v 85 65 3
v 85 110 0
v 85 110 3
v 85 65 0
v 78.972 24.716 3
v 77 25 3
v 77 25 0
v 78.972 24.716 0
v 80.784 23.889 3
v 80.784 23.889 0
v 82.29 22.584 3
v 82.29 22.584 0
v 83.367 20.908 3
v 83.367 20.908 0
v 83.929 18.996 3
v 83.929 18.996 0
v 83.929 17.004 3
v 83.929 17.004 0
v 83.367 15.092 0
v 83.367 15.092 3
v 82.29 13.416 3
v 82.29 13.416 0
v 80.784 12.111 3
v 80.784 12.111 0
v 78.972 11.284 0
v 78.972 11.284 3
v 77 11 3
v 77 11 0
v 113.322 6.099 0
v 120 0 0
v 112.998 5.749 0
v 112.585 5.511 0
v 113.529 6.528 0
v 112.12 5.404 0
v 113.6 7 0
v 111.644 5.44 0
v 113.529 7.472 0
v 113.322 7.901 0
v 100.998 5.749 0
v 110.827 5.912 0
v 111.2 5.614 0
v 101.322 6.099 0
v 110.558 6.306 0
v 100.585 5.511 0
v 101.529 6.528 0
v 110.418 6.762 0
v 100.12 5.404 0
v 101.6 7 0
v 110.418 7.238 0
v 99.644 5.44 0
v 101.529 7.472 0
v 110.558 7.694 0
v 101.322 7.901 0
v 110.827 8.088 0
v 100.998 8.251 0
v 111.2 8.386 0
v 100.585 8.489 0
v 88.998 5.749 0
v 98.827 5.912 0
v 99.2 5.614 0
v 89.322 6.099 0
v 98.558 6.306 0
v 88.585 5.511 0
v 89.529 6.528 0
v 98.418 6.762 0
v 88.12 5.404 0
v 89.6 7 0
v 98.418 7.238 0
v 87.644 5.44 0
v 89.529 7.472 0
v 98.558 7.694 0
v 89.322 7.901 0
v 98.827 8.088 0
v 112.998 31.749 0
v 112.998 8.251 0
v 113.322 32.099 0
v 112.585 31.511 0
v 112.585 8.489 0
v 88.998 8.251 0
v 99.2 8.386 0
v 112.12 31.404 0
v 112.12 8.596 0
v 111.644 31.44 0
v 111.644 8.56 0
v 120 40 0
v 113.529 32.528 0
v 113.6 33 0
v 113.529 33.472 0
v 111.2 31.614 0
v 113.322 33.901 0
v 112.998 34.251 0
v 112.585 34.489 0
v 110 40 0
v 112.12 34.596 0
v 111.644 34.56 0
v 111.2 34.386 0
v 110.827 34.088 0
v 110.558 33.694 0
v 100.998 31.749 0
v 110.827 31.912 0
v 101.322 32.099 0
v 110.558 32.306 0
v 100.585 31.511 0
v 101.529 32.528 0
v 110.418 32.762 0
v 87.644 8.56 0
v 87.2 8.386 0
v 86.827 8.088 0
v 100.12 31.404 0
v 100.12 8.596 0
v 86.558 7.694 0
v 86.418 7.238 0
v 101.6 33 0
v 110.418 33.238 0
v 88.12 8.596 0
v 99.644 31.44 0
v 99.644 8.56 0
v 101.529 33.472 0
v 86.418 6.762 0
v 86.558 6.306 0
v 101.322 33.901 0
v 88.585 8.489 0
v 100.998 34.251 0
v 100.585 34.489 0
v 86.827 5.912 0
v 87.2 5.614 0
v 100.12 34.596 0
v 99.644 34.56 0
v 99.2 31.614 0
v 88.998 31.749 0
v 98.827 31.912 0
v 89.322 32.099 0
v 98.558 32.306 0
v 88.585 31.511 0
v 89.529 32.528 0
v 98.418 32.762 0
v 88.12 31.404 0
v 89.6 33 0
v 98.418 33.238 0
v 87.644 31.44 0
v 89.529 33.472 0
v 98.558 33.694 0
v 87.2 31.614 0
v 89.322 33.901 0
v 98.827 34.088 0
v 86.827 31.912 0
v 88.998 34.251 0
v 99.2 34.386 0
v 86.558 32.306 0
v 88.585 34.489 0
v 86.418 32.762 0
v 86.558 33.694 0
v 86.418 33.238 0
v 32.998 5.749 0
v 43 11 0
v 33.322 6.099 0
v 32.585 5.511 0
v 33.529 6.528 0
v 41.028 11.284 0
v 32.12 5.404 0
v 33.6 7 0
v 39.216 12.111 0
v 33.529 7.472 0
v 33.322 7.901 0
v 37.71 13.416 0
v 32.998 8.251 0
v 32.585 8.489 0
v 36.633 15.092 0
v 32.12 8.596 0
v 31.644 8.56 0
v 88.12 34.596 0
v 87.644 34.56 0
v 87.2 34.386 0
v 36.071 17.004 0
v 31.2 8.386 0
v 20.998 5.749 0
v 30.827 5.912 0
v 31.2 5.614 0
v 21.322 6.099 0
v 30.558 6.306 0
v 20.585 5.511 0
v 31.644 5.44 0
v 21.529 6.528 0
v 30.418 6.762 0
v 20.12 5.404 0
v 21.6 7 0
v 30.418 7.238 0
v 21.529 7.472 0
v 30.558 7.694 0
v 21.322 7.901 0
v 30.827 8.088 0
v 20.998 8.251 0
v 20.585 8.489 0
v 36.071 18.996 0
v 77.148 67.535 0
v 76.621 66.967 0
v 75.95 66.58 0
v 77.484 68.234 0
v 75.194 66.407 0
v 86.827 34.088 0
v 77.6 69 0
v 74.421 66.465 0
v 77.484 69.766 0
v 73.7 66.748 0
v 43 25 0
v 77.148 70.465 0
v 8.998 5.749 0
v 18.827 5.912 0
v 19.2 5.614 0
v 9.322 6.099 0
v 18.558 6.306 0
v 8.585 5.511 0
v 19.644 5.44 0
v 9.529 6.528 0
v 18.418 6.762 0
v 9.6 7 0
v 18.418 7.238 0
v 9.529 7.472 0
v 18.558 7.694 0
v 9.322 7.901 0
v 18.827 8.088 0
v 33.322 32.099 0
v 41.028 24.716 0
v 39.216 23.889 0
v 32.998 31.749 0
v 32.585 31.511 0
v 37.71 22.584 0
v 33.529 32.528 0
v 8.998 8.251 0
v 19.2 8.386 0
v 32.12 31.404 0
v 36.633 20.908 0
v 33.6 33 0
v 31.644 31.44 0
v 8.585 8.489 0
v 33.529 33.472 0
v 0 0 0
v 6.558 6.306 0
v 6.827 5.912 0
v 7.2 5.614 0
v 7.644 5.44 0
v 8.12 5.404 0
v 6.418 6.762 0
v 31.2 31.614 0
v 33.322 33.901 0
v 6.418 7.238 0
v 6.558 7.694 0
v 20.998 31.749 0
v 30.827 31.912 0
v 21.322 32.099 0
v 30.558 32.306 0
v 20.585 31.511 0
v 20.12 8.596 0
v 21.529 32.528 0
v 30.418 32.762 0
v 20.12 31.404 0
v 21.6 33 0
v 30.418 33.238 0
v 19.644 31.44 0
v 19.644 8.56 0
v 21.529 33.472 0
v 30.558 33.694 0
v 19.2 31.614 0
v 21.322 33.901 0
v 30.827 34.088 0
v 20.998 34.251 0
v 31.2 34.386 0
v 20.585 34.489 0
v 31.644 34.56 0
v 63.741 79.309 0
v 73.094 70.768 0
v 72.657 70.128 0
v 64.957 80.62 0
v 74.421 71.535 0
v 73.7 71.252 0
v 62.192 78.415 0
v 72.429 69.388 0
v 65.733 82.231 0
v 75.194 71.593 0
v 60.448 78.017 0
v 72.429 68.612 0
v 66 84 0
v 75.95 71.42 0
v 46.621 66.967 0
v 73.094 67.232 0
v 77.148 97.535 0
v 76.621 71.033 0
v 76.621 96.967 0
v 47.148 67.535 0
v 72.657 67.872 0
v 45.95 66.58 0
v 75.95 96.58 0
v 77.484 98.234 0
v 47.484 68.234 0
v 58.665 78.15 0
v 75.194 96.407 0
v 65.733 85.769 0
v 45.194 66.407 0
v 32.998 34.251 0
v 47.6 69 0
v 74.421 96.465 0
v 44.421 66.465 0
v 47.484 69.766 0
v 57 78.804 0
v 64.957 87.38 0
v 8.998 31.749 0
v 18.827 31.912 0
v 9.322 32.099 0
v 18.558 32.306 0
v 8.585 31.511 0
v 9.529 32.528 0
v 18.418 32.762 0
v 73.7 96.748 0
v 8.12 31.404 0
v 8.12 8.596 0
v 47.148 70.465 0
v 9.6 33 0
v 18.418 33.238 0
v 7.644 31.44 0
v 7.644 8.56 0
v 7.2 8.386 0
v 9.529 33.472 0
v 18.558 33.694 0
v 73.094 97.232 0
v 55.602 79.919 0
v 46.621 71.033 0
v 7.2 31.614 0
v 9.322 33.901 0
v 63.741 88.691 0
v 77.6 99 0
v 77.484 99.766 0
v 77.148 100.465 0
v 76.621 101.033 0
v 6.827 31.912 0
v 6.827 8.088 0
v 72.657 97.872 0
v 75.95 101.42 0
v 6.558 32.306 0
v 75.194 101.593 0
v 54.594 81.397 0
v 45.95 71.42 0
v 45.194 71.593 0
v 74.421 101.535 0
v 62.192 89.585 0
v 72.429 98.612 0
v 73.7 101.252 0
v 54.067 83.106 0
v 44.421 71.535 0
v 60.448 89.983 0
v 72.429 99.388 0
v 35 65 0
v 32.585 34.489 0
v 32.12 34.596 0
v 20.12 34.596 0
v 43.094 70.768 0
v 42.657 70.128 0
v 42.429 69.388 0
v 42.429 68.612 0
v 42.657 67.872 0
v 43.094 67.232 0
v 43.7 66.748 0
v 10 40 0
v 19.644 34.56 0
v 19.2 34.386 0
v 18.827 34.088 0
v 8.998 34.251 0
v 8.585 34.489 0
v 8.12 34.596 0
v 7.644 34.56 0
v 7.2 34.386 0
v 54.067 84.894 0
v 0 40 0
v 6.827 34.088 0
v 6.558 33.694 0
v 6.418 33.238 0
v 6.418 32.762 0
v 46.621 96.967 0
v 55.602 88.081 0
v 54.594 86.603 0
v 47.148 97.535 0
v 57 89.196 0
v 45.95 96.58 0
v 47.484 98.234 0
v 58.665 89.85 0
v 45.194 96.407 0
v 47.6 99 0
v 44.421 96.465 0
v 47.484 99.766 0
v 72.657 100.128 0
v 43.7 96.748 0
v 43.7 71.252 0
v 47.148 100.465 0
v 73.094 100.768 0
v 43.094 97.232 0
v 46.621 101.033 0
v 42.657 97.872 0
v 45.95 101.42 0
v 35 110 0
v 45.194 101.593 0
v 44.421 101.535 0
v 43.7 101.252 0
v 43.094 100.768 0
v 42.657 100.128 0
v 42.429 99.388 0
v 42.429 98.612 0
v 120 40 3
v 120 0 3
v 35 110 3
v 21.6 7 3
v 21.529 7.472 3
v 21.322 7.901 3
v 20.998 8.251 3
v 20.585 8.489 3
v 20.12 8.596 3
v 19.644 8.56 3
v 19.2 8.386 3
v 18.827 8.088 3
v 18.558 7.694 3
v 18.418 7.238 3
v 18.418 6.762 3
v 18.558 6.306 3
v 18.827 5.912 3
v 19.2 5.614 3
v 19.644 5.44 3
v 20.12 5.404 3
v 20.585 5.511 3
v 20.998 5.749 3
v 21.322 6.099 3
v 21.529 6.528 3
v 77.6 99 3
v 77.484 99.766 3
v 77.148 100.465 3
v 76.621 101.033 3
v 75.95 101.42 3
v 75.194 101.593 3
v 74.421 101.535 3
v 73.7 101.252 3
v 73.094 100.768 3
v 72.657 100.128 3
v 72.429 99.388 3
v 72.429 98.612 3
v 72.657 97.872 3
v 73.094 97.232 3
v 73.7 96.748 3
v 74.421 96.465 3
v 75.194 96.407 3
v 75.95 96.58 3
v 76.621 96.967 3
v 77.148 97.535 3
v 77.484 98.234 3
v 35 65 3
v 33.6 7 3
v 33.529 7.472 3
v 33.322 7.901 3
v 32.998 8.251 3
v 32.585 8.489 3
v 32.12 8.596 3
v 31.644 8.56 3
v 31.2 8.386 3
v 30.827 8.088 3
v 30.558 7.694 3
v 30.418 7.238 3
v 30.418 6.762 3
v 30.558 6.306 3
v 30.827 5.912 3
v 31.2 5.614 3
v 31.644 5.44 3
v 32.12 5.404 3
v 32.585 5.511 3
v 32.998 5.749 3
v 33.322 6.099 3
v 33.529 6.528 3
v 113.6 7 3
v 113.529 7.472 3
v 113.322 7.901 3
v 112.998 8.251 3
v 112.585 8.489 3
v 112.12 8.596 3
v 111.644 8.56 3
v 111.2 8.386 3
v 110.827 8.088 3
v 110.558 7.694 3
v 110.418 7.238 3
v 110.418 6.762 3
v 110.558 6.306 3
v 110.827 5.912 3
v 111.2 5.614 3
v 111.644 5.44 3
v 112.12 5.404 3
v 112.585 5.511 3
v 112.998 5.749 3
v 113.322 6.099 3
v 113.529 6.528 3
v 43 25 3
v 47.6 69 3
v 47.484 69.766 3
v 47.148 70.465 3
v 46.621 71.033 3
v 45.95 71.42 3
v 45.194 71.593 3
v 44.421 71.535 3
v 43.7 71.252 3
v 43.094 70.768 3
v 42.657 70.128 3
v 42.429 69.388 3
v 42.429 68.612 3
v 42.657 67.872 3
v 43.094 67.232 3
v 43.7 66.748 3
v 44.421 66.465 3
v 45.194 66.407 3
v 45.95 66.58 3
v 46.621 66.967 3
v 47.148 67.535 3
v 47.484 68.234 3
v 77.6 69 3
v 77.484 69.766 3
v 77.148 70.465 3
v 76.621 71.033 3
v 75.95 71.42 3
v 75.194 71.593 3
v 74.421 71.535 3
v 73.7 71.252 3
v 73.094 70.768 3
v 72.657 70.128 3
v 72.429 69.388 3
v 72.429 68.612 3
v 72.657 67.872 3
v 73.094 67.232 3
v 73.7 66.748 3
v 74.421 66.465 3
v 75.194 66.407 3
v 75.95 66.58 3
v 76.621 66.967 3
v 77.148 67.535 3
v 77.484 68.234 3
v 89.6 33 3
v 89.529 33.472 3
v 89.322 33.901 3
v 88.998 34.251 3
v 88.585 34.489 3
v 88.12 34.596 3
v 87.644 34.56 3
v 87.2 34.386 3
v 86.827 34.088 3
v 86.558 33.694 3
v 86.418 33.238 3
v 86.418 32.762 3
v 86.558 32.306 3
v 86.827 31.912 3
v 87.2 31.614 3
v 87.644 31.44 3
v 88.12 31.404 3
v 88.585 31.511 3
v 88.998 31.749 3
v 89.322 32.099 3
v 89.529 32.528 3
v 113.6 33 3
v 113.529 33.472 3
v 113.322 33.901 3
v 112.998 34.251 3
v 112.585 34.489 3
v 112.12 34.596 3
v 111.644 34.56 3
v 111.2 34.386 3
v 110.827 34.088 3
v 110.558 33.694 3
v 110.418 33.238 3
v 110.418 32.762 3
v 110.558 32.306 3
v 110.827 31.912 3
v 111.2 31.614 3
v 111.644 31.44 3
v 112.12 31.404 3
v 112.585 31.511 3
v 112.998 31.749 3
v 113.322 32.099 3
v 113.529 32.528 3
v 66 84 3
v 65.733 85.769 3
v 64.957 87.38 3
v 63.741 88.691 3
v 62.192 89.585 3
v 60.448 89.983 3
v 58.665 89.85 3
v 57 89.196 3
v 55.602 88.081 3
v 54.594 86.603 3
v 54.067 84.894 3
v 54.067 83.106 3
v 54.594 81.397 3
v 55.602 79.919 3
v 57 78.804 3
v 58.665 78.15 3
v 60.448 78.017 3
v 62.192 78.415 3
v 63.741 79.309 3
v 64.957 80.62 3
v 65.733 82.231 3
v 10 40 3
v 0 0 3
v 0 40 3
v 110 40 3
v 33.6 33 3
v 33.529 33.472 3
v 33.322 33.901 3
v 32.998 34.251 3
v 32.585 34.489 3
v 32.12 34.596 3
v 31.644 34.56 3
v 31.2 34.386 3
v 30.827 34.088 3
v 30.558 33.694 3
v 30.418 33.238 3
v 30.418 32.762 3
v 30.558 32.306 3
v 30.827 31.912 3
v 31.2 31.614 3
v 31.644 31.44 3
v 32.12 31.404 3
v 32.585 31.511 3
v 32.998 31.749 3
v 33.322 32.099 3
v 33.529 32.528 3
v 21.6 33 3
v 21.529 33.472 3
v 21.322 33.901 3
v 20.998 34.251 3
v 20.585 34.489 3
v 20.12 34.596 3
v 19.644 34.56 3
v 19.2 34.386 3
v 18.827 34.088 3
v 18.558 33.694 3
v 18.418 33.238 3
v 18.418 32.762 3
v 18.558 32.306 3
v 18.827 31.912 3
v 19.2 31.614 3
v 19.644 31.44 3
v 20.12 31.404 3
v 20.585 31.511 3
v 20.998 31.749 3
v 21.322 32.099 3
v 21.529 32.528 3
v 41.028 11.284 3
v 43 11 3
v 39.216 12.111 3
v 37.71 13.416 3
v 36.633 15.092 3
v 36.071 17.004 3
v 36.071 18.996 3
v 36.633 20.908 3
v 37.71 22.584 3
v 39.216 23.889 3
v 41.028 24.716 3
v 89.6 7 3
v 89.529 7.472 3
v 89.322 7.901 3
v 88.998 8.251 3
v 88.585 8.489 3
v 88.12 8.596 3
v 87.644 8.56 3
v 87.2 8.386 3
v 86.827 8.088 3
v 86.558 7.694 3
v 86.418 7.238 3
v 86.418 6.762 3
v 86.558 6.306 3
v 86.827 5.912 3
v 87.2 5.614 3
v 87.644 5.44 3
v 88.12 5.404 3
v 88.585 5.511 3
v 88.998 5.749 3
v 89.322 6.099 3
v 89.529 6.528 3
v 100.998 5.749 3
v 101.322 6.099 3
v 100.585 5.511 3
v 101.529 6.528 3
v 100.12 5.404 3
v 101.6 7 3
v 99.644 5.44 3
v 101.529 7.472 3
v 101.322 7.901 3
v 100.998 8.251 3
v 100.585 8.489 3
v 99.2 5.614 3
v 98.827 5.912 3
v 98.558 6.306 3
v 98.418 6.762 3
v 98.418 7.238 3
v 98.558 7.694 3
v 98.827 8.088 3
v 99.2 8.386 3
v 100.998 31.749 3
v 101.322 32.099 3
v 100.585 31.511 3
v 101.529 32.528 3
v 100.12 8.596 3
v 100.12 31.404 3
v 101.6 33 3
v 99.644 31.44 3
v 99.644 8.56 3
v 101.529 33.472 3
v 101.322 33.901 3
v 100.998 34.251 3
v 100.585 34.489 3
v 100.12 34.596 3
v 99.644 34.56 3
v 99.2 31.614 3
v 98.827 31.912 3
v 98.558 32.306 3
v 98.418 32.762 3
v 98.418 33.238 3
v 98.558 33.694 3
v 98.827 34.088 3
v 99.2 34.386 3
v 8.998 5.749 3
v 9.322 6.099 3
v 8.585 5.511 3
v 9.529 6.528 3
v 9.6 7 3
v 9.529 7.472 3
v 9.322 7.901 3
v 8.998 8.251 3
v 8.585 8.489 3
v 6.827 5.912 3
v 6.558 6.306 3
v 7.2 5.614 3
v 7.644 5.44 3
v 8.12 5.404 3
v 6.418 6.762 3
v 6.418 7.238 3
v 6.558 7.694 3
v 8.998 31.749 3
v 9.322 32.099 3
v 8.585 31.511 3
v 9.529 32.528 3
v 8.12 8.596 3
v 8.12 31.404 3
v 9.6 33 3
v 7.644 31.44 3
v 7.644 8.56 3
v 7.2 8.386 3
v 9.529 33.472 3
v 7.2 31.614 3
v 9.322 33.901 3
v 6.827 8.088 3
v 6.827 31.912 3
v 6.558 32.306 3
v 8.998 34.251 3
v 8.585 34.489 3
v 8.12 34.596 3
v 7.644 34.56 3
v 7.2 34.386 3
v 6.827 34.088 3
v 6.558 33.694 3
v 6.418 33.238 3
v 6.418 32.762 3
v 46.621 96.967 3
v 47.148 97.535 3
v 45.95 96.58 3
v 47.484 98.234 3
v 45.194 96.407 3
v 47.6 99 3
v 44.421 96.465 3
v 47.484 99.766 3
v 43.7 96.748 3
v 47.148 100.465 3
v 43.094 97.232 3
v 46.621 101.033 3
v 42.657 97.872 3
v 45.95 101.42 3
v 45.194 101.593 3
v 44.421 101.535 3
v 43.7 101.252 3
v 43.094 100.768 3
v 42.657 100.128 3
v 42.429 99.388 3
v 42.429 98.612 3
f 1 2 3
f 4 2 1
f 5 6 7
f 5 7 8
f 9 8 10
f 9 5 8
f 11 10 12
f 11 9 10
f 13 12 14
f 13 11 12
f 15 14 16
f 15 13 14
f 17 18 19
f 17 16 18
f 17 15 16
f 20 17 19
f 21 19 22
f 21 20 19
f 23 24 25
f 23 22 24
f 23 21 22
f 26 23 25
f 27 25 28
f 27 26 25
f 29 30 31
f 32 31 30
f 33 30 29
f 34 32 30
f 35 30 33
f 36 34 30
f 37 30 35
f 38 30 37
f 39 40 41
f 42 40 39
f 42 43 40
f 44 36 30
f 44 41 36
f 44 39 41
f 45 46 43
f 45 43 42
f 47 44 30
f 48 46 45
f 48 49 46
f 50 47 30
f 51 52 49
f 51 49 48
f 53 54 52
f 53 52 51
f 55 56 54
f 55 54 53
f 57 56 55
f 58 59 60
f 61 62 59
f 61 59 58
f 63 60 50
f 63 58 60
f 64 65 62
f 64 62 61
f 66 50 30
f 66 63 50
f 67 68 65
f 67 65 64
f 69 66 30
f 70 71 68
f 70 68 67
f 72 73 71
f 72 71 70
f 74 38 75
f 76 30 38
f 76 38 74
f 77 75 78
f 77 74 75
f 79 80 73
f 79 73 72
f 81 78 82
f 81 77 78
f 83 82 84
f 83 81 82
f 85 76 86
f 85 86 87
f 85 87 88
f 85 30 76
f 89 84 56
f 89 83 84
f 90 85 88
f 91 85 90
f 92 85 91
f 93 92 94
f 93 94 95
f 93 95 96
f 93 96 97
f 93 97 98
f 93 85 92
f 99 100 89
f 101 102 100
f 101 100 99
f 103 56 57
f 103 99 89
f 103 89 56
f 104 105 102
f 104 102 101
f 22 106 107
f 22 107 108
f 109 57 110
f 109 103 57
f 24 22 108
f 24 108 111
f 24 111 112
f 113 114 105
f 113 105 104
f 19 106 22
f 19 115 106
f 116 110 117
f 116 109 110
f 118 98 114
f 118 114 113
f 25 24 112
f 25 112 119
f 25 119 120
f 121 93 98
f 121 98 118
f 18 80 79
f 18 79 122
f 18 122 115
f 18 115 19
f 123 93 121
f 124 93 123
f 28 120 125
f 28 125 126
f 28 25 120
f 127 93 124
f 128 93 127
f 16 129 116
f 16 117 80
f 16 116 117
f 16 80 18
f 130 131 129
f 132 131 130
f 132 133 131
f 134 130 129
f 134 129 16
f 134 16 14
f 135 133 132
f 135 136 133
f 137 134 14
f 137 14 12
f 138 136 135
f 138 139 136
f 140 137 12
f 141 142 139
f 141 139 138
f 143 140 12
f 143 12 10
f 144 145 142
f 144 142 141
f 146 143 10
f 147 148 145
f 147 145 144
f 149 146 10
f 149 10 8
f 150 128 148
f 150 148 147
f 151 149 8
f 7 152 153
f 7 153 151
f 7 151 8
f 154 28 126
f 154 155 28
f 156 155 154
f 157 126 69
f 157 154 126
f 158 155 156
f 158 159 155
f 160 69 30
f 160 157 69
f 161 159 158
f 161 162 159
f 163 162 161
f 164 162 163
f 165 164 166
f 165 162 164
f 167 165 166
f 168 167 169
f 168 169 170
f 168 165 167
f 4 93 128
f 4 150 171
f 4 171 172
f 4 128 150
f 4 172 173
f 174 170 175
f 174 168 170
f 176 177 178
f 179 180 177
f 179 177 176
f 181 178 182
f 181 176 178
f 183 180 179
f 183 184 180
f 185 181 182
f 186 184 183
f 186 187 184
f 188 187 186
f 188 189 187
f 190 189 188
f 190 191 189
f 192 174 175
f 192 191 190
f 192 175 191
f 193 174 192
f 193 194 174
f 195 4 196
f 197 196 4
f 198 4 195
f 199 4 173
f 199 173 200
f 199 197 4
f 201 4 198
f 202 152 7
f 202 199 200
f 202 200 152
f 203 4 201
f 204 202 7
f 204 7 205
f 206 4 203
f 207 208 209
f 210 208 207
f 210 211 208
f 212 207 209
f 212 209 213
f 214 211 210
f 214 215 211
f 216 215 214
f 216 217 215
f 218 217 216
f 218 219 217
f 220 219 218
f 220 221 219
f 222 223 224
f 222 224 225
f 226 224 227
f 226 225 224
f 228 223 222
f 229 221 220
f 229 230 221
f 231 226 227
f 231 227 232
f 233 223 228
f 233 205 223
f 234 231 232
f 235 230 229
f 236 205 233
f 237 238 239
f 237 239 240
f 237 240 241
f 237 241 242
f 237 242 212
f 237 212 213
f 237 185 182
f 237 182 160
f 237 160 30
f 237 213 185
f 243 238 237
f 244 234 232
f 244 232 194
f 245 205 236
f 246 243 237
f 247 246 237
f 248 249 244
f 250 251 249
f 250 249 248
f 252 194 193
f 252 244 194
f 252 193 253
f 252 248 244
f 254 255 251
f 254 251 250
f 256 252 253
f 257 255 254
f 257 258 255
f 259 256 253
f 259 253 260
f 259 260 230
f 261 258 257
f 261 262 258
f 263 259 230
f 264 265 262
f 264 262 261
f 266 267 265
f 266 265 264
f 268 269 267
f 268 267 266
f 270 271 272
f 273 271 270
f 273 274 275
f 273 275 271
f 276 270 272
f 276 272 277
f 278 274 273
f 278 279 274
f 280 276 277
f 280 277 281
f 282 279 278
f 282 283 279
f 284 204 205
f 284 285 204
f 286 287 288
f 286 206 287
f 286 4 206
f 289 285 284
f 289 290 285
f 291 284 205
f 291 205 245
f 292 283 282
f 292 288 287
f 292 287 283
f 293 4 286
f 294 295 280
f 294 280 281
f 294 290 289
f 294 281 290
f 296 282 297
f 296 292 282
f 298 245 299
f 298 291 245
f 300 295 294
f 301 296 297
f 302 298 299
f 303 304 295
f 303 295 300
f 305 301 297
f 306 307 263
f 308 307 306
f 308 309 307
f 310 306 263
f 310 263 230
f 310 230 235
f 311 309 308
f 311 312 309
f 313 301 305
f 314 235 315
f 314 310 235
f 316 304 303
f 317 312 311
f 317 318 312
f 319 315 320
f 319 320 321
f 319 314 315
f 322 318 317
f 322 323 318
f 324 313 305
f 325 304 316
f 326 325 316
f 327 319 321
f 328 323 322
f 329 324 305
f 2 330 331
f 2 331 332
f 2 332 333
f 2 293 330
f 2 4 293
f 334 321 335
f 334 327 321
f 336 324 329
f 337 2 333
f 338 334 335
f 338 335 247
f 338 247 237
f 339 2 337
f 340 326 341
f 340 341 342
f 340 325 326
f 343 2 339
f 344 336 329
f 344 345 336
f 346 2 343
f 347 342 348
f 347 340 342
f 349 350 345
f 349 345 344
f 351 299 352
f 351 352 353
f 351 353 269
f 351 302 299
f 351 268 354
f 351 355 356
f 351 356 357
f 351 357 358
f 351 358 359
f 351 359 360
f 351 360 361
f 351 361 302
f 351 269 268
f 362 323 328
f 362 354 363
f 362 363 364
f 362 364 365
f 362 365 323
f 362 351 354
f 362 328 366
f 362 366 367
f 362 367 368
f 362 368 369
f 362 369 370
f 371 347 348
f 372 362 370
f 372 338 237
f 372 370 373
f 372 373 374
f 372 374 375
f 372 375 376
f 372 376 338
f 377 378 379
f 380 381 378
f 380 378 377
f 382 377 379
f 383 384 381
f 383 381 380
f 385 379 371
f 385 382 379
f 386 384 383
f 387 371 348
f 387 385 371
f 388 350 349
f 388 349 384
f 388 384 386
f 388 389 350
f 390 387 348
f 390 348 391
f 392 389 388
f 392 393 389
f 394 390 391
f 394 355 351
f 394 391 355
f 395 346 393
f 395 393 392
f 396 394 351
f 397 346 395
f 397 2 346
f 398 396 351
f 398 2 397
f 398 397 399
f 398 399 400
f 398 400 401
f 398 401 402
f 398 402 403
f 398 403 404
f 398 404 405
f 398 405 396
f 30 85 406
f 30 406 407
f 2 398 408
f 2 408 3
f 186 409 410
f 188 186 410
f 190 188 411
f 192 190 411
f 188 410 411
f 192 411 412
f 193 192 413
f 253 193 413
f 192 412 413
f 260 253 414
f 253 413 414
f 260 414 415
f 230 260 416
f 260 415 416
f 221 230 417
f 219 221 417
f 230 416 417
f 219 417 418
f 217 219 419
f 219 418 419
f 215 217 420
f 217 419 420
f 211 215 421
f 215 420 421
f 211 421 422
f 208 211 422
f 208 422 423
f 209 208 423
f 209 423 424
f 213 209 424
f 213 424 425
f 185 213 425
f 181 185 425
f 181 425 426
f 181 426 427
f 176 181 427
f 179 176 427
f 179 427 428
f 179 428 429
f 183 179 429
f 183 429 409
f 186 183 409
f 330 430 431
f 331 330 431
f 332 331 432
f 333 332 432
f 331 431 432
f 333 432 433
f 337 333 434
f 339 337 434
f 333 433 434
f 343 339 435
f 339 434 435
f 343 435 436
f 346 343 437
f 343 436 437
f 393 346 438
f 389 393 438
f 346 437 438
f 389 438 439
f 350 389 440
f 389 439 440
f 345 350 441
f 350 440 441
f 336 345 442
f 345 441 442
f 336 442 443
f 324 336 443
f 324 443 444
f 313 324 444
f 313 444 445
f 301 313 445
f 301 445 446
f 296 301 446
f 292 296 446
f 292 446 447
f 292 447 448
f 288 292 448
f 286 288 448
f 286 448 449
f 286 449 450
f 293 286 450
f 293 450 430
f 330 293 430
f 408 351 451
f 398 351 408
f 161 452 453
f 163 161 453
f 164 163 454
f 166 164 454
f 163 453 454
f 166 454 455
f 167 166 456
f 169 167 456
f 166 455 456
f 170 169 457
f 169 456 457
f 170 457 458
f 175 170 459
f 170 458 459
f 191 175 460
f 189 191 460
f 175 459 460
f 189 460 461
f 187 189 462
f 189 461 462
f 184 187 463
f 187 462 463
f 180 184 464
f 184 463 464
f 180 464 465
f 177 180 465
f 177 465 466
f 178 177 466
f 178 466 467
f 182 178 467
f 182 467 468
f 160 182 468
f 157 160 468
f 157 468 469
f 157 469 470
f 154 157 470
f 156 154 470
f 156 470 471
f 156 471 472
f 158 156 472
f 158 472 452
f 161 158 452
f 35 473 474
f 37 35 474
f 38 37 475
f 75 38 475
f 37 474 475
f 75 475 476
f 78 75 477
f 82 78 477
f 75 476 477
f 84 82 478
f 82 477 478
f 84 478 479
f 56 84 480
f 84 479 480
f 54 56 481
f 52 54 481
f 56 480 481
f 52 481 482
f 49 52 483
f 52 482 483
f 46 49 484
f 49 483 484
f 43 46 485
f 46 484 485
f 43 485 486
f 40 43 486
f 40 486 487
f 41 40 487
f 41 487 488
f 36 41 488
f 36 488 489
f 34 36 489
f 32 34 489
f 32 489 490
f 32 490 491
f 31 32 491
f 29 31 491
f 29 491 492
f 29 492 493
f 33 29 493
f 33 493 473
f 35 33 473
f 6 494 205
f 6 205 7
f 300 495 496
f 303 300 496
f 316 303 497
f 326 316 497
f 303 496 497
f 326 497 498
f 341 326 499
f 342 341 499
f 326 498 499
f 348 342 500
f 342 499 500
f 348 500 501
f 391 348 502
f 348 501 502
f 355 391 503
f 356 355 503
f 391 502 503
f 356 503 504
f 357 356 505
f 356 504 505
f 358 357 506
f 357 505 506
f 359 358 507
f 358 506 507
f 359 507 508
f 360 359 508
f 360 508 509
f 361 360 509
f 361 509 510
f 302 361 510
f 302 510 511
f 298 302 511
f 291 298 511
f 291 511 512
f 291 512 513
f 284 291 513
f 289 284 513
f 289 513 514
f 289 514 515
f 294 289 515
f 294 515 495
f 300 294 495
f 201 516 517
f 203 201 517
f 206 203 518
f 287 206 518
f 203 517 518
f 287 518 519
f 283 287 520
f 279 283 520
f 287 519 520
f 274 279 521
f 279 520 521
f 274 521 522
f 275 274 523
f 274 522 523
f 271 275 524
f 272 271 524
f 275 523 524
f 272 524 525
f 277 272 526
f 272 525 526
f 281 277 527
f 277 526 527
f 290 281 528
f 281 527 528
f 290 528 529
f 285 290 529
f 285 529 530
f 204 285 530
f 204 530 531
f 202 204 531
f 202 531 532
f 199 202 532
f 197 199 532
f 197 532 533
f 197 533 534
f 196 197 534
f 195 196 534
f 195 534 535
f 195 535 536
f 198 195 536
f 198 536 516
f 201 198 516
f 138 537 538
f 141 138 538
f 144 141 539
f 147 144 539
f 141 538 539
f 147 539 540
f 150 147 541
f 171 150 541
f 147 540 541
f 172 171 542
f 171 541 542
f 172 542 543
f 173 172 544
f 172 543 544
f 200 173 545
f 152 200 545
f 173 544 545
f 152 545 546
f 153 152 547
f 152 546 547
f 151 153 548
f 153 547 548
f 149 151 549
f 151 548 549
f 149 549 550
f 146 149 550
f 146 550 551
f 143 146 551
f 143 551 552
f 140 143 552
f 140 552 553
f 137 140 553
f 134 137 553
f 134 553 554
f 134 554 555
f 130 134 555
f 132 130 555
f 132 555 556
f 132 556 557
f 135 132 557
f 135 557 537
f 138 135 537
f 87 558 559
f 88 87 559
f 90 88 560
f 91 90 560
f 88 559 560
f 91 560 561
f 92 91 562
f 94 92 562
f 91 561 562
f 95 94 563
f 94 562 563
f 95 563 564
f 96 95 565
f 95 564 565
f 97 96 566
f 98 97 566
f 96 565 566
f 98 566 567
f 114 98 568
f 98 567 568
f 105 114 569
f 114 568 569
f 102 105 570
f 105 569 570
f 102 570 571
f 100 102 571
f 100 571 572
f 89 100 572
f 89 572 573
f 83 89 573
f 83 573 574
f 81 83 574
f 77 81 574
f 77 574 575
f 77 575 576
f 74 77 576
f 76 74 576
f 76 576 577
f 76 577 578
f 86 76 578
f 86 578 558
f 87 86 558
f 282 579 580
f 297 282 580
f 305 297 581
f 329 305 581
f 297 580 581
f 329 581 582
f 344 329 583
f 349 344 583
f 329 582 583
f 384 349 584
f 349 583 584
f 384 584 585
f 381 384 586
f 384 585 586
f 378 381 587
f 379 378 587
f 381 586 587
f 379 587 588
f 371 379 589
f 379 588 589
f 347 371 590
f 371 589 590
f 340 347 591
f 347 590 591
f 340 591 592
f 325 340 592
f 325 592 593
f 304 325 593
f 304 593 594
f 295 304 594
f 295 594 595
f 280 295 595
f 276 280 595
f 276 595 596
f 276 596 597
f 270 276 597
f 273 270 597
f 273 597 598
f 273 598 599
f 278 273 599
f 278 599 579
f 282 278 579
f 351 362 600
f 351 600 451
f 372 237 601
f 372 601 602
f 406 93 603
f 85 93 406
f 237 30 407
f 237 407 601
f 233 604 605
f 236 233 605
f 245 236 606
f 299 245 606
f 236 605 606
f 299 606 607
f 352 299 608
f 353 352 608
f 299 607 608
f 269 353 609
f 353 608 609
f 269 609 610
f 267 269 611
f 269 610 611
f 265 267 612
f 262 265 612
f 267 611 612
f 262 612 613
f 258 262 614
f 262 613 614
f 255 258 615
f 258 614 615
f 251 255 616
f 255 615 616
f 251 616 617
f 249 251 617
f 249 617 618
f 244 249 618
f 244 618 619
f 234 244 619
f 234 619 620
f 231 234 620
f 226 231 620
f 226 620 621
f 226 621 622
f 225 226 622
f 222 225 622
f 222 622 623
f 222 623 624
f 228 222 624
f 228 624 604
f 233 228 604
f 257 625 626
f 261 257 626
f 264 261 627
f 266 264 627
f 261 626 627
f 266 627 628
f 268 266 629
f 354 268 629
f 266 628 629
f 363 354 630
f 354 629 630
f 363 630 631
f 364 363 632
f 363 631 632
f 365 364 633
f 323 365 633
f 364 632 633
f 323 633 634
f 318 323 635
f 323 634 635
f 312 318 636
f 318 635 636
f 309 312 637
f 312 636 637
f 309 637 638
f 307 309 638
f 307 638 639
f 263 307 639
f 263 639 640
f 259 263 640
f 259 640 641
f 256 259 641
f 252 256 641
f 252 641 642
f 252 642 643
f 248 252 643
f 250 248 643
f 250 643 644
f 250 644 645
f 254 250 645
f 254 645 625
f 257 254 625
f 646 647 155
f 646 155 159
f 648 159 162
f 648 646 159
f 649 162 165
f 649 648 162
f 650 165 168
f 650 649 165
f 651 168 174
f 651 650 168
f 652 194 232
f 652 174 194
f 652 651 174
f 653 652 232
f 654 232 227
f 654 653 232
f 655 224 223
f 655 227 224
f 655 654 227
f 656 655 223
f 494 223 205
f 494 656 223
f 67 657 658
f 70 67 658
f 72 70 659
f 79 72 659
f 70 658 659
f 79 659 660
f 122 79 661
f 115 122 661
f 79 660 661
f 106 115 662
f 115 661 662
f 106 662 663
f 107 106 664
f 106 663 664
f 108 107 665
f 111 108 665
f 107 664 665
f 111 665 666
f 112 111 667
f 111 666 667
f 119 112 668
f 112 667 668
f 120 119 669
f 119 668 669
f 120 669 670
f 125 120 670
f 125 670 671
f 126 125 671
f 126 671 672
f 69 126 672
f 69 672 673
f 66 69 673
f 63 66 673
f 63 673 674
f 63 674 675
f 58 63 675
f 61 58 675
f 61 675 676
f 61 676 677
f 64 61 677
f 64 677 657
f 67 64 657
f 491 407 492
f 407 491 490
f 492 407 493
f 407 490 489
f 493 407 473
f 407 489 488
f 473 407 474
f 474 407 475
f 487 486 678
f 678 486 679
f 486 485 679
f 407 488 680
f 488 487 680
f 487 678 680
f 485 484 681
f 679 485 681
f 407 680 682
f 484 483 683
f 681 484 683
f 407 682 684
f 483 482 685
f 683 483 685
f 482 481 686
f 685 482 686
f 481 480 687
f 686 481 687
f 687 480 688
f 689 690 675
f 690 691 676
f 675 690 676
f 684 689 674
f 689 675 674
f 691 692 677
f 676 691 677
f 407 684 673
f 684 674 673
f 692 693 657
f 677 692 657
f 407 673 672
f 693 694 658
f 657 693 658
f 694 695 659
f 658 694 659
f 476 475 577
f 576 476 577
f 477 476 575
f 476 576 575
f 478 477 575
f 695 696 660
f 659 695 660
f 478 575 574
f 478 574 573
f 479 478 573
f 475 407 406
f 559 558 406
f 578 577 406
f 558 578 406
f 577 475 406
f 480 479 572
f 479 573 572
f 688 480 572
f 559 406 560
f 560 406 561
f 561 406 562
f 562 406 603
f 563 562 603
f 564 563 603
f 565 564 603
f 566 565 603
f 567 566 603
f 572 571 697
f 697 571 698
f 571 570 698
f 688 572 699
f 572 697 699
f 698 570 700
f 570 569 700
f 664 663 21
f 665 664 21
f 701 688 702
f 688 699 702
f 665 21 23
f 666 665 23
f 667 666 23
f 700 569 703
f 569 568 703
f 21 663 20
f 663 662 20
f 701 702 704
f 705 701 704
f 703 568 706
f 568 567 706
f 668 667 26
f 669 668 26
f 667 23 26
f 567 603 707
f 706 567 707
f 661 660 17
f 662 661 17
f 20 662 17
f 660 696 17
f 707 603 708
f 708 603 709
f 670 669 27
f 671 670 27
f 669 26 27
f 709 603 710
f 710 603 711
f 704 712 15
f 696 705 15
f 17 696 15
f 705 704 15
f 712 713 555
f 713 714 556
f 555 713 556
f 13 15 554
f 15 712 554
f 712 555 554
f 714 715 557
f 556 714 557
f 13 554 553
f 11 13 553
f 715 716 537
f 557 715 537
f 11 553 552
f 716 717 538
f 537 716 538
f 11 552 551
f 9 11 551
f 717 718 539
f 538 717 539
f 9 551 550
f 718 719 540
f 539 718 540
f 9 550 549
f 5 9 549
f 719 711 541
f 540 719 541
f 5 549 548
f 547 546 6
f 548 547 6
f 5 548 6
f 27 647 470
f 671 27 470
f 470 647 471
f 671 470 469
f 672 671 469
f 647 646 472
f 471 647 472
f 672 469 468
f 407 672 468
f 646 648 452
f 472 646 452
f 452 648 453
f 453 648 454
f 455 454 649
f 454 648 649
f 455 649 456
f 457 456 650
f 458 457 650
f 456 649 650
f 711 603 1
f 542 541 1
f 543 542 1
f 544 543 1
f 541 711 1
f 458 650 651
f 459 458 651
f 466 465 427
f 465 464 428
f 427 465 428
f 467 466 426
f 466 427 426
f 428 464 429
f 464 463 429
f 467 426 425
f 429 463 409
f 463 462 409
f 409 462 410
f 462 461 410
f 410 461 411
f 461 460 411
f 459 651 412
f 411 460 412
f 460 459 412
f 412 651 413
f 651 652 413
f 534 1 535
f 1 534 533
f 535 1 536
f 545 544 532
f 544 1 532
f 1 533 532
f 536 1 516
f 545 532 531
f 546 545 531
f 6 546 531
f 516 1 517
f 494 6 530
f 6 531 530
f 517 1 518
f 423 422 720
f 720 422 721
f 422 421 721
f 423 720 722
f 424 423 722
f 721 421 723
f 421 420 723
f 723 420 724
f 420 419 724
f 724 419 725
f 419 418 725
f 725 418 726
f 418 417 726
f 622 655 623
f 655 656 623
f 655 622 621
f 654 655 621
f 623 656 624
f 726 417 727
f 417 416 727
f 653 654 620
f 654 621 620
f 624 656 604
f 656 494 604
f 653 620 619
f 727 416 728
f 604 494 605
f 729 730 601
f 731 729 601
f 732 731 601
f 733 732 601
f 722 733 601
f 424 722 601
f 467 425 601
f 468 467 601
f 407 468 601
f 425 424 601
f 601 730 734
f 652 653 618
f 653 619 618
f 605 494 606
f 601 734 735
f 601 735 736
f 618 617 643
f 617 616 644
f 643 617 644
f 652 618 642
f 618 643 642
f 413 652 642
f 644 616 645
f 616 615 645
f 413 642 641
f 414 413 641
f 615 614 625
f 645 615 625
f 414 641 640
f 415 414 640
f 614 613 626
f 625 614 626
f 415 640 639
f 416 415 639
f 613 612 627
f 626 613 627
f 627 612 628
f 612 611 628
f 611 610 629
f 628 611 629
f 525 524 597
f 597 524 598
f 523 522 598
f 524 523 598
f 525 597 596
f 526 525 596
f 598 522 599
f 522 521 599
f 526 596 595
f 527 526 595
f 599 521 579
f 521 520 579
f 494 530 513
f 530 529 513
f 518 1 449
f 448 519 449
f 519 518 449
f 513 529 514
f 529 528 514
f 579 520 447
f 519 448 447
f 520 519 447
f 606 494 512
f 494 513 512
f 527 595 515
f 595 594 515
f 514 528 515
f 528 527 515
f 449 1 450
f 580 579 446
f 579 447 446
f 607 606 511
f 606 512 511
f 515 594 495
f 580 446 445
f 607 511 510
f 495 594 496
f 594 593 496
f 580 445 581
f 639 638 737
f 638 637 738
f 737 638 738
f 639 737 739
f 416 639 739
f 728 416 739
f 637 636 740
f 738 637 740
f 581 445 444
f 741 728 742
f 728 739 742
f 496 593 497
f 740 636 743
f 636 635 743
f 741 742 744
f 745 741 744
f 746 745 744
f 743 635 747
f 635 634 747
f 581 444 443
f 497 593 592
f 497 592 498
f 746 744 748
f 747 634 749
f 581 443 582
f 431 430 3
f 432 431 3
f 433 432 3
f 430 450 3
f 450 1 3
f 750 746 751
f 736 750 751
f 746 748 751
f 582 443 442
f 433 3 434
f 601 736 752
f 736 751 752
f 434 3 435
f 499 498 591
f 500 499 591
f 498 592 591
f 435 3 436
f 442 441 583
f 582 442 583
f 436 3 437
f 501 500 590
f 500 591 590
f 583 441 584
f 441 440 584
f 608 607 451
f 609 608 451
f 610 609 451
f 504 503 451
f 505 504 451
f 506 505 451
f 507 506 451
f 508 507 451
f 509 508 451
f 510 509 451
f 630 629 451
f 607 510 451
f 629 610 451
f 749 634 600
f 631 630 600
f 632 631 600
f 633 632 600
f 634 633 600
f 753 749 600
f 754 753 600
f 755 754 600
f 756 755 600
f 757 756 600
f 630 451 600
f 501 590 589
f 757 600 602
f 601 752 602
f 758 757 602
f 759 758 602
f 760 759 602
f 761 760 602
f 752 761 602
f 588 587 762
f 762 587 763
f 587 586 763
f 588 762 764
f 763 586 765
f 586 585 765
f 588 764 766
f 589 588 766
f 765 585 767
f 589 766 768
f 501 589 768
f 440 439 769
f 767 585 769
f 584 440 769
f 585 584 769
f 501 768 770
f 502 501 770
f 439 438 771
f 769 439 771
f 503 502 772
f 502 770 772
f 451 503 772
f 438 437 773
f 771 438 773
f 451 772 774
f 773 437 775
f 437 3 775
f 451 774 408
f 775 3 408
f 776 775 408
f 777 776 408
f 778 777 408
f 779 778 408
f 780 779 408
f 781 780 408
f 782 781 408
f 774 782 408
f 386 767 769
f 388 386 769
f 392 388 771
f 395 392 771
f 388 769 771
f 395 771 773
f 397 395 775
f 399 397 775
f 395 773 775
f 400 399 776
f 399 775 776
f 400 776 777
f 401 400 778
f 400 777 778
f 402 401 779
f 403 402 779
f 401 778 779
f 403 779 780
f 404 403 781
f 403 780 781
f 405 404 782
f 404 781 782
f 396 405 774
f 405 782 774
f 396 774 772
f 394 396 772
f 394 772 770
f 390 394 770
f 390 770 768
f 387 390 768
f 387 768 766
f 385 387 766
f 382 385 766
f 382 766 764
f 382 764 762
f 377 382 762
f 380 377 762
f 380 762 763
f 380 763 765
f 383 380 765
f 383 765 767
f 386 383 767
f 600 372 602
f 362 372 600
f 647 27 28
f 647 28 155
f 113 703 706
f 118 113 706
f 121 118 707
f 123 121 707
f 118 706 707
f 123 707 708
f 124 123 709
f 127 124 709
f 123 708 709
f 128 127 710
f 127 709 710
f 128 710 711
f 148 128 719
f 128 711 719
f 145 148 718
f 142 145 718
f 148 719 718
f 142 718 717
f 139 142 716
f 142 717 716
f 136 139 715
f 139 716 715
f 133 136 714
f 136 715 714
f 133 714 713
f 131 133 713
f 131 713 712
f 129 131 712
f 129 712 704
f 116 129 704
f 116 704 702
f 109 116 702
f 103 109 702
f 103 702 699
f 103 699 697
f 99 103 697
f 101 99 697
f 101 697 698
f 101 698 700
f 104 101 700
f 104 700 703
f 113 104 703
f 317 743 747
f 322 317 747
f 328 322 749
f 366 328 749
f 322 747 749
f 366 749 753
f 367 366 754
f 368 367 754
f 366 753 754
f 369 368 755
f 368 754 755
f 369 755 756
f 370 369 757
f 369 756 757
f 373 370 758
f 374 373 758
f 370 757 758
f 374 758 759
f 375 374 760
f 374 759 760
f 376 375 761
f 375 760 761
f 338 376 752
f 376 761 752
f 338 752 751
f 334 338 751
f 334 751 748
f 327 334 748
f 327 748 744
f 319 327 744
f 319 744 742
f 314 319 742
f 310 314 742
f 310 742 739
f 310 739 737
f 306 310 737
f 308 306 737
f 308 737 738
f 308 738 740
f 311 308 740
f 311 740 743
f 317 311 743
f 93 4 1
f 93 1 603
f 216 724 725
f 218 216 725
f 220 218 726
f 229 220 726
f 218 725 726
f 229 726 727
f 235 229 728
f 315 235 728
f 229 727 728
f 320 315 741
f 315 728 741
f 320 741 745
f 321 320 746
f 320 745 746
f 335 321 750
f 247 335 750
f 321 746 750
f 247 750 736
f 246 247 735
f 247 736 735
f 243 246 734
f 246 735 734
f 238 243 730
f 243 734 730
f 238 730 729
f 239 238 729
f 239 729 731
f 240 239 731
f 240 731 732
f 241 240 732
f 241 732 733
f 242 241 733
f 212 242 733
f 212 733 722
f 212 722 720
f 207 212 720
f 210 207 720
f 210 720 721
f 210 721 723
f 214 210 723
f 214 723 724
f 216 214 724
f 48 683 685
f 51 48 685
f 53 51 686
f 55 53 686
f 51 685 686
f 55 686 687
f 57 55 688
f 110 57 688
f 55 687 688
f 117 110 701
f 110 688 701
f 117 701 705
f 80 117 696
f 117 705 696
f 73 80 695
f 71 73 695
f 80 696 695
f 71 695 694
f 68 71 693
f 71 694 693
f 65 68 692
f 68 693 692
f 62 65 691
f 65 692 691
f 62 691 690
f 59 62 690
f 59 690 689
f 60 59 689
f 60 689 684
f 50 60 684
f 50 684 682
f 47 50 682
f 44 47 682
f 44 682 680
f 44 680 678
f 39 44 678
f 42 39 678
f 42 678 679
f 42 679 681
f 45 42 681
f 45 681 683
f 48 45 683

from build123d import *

# Parameters (mm, degrees)
EXTRUDE_1_DEPTH     = 3
SKETCH_2_R          = 2.6
SKETCH_2_R_2        = 1.6
SKETCH_2_R_3        = 6
CUT_EXTRUDE_1_DEPTH = 10


with BuildPart() as part:
    # 草图1 → 凸台-拉伸1 (new body)
    with BuildSketch(Plane.XY):
        Polygon((0, 0), (0, 40), (10, 40), (35, 65), (35, 110), (85, 110), (85, 65), (110, 40), (120, 40), (120, 0), align=None)
    extrude(amount=EXTRUDE_1_DEPTH)

    # 草图2 → 切除-拉伸1 (cut)
    with BuildSketch(Plane.XY.offset(3)):
        with Locations((45, 99)):
            Circle(SKETCH_2_R)
        with Locations((75, 99)):
            Circle(SKETCH_2_R)
        with Locations((75, 69)):
            Circle(SKETCH_2_R)
        with Locations((45, 69)):
            Circle(SKETCH_2_R)
        with Locations((8, 33)):
            Circle(SKETCH_2_R_2)
        with Locations((8, 7)):
            Circle(SKETCH_2_R_2)
        with Locations((112, 33)):
            Circle(SKETCH_2_R_2)
        with Locations((112, 7)):
            Circle(SKETCH_2_R_2)
        with Locations((20, 33)):
            Circle(SKETCH_2_R_2)
        with Locations((100, 33)):
            Circle(SKETCH_2_R_2)
        with Locations((20, 7)):
            Circle(SKETCH_2_R_2)
        with Locations((100, 7)):
            Circle(SKETCH_2_R_2)
        with Locations((32, 33)):
            Circle(SKETCH_2_R_2)
        with Locations((32, 7)):
            Circle(SKETCH_2_R_2)
        with Locations((88, 33)):
            Circle(SKETCH_2_R_2)
        with Locations((88, 7)):
            Circle(SKETCH_2_R_2)
        with Locations((60, 84)):
            Circle(SKETCH_2_R_3)
        with BuildLine():
            Line((43, 25), (77, 25))
            ThreePointArc((77, 25), (84, 18), (77, 11))
            Line((77, 11), (43, 11))
            ThreePointArc((43, 11), (36, 18), (43, 25))
        make_face()
    extrude(amount=-CUT_EXTRUDE_1_DEPTH, mode=Mode.SUBTRACT)


solid = part.part
